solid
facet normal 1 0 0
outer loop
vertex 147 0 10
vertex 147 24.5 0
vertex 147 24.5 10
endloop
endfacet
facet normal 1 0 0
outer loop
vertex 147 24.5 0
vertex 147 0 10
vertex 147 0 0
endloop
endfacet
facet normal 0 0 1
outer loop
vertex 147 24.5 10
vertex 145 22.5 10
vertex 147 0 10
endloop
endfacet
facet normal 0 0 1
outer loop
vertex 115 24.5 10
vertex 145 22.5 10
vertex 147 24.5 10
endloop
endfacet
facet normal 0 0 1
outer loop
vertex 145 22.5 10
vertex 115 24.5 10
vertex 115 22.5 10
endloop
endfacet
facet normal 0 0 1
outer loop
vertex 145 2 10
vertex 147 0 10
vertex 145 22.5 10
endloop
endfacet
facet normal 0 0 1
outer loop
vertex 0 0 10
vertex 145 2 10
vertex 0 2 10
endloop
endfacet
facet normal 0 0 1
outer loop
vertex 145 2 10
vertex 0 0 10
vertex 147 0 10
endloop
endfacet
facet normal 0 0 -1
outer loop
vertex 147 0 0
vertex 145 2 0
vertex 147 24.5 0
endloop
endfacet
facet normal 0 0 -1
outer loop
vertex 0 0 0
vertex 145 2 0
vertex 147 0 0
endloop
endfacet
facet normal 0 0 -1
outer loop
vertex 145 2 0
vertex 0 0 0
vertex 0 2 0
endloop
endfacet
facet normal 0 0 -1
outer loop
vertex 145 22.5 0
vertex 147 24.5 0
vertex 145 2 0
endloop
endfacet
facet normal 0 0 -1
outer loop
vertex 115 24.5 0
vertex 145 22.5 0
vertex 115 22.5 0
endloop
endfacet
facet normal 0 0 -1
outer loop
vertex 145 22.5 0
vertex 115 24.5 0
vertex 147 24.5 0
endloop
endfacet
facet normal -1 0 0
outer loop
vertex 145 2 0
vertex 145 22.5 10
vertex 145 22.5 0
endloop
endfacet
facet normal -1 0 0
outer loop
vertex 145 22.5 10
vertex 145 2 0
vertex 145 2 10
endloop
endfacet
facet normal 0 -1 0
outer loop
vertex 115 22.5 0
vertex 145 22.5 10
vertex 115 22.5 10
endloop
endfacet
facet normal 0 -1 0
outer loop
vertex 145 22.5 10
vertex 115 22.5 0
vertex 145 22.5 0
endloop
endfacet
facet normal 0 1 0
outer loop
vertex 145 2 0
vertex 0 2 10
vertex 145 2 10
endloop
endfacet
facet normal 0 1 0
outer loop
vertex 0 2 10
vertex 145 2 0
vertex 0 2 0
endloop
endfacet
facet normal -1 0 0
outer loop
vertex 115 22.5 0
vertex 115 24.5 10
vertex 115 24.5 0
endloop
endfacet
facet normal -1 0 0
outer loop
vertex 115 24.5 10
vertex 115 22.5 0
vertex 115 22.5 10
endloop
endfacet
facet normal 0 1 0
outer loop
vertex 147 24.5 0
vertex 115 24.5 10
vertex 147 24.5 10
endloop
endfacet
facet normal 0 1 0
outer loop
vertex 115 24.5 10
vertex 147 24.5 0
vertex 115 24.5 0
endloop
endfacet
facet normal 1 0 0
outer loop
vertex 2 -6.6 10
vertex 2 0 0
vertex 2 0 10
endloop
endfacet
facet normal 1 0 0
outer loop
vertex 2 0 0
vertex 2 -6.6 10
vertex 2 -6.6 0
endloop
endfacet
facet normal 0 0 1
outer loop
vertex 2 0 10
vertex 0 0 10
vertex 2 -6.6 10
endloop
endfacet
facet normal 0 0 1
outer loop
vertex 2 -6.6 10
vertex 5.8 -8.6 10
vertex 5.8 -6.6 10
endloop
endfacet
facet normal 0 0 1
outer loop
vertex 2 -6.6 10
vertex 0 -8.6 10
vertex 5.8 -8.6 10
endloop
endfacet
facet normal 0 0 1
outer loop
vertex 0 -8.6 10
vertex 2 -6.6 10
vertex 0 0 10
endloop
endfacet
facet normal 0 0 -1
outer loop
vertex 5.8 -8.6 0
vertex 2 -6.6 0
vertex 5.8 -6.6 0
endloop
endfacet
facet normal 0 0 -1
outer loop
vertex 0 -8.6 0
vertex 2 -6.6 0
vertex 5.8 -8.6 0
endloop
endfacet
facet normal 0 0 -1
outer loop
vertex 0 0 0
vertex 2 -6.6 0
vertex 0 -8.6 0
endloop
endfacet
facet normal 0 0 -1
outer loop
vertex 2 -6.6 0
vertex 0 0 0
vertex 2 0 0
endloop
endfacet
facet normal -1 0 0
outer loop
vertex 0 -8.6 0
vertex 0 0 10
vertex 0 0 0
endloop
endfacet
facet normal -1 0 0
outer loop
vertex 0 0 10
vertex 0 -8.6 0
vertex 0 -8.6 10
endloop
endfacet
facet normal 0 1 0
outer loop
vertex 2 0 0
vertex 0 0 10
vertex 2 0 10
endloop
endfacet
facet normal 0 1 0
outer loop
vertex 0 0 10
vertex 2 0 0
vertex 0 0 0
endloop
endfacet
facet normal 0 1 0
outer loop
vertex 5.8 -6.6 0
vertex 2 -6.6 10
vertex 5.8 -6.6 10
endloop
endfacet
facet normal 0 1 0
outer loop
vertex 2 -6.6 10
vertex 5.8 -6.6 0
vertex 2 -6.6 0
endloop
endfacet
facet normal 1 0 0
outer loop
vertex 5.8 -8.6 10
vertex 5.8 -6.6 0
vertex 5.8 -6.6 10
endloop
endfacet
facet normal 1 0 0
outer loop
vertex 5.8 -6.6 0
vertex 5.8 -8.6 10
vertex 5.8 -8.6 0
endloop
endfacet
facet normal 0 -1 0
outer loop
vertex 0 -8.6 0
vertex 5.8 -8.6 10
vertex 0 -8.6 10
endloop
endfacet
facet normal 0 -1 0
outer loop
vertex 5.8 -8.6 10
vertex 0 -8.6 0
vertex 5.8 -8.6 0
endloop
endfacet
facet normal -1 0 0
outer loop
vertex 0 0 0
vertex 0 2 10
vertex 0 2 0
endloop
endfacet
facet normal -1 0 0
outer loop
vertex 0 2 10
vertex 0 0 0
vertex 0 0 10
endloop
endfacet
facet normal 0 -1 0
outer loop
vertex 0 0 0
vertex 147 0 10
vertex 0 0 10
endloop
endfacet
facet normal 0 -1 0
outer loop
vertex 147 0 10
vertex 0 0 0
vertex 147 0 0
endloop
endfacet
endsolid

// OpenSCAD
booklet_height = 145;
booklet_thickness = 20.5;
booklet_ledge = 30;
hanger_width = 10;
thickness = 2;
ledge_thickness = 3.8;
panel_thickness = 6.6;
$fs = 0.1;
$fa = 1;

cube([booklet_height + thickness, thickness, hanger_width]);
translate([booklet_height, thickness, 0]) {
	cube([thickness, booklet_thickness, hanger_width]);
	translate([-booklet_ledge, booklet_thickness, 0]) {
		cube([booklet_ledge + thickness, thickness, hanger_width]);
	}
}
translate([0, -panel_thickness, 0]) {
	cube([thickness, panel_thickness, hanger_width]);
	translate([0, -thickness, 0]) {
		cube([thickness + ledge_thickness, thickness, hanger_width]);
	}
}
